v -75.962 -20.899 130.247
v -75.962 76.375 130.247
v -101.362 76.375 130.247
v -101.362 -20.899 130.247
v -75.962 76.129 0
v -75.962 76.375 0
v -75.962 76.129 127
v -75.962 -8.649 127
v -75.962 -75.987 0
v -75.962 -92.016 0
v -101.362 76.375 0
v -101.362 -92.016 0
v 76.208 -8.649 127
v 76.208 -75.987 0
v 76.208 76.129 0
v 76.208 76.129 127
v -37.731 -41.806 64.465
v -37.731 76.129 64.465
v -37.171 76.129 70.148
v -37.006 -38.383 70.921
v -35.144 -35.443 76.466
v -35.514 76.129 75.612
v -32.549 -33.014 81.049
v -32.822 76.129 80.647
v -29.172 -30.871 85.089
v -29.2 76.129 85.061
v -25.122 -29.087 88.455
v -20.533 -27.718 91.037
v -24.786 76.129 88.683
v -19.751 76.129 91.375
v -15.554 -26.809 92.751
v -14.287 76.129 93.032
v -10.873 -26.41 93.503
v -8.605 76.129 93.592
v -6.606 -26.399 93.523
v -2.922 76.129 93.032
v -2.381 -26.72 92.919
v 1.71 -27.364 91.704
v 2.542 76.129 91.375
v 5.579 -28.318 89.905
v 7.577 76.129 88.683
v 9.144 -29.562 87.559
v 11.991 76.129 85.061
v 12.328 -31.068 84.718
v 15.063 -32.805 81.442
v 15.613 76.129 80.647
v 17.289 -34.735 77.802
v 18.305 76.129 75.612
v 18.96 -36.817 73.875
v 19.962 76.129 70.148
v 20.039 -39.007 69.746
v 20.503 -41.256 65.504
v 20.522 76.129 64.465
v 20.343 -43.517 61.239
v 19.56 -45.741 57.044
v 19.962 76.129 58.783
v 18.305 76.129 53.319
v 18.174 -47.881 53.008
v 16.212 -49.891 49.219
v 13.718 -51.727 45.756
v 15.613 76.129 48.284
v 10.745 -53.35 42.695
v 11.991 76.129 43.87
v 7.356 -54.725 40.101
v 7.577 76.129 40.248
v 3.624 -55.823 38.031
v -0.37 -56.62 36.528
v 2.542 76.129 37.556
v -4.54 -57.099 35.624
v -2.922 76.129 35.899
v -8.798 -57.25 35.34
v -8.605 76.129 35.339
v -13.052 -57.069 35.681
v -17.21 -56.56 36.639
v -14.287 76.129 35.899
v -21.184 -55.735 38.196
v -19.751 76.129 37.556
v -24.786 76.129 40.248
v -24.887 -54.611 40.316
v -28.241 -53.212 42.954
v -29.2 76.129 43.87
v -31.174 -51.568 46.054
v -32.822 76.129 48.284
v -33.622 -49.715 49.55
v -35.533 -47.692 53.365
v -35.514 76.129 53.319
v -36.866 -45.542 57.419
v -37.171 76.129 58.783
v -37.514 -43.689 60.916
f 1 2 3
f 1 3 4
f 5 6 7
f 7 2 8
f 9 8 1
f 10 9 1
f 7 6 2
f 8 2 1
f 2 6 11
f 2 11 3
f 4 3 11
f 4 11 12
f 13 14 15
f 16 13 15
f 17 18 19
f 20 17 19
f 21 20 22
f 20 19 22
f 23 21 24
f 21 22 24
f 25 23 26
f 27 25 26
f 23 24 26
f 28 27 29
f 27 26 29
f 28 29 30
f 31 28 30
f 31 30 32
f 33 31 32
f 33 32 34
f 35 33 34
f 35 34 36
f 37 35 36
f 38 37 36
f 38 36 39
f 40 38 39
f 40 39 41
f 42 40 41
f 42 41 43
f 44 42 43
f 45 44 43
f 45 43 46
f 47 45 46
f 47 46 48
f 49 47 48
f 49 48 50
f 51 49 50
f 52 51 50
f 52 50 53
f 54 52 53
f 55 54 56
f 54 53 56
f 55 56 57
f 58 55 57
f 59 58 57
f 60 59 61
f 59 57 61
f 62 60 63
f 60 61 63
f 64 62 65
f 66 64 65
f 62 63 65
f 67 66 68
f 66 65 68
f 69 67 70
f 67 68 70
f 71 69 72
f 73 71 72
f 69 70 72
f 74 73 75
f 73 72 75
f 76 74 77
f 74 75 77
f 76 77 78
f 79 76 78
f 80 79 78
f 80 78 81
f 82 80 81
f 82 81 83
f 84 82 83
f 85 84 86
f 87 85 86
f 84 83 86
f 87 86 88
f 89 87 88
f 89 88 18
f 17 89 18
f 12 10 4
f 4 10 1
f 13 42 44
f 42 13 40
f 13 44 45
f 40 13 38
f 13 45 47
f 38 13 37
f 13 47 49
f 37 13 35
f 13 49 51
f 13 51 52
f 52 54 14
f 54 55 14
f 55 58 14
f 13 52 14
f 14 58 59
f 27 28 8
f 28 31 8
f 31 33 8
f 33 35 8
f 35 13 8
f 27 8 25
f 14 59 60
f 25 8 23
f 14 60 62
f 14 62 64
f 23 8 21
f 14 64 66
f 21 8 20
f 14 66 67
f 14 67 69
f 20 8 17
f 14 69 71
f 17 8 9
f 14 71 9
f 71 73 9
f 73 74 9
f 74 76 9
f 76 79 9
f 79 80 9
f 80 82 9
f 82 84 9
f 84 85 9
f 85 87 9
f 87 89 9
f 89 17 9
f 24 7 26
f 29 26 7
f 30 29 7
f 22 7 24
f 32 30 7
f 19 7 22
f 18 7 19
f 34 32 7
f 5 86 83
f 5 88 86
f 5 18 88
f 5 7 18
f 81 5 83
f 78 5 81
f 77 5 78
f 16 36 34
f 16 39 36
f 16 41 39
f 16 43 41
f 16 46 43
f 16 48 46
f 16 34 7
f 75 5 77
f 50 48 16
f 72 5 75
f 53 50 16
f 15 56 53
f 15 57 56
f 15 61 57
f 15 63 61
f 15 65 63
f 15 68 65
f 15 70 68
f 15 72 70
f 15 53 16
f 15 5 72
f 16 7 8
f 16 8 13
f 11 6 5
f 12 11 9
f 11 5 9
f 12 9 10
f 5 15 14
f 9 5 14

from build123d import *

# Parameters (mm, degrees)
F0_W      = 152.1705836058
F0_H      = 152.1167457104
F1_DEPTH  = 127
F3_DEPTH  = 254
F4_R      = 29.1263890726
F5_DEPTH  = 2540
F7_W      = 168.390661478
F7_H      = 130.2470117807
F8_DEPTH  = 25.4
F10_DEPTH = 2540


with BuildPart() as f1:
    # F0 (on Top) → F1 (new body)
    with BuildSketch(Plane.XY):
        with Locations((0.122949481, 0.0709816813)):
            Rectangle(F0_W, F0_H)
    extrude(amount=F1_DEPTH)

    # F2 (on face) → F3 (cut)
    with BuildSketch(Plane(origin=(-75.9623423219, 0, 0), x_dir=(0, -1, 0), z_dir=(-1, 0, 0))):
        Polygon((75.9873911738, 127), (8.6493911222, 127), (75.9873911738, 0), align=None)
    extrude(amount=-F3_DEPTH, mode=Mode.SUBTRACT)

    # F4 (on face) → F5 (cut)
    with BuildSketch(Plane(origin=(0, 76.1293545365, 0), x_dir=(-1, 0, 0), z_dir=(0, 1, 0))):
        with Locations((8.6046149954, 64.465470612)):
            Circle(F4_R)
    extrude(amount=-F5_DEPTH, mode=Mode.SUBTRACT)

    # F7 (on face) → F8 (join)
    with BuildSketch(Plane(origin=(-75.9623423219, 0, 0), x_dir=(0, -1, 0), z_dir=(-1, 0, 0))):
        with Locations((7.8207552433, 65.1235058904)):
            Rectangle(F7_W, F7_H)
    extrude(amount=F8_DEPTH)

    # F9 (on face) → F10 (cut)
    with BuildSketch(Plane.YZ.offset(-75.9623423219)):
        Polygon((-92.0160859823, 0), (-20.8989176899, 130.2470117807), (-92.0160859823, 130.2470117807), align=None)
    extrude(amount=-F10_DEPTH, mode=Mode.SUBTRACT)


solid = f1.part
